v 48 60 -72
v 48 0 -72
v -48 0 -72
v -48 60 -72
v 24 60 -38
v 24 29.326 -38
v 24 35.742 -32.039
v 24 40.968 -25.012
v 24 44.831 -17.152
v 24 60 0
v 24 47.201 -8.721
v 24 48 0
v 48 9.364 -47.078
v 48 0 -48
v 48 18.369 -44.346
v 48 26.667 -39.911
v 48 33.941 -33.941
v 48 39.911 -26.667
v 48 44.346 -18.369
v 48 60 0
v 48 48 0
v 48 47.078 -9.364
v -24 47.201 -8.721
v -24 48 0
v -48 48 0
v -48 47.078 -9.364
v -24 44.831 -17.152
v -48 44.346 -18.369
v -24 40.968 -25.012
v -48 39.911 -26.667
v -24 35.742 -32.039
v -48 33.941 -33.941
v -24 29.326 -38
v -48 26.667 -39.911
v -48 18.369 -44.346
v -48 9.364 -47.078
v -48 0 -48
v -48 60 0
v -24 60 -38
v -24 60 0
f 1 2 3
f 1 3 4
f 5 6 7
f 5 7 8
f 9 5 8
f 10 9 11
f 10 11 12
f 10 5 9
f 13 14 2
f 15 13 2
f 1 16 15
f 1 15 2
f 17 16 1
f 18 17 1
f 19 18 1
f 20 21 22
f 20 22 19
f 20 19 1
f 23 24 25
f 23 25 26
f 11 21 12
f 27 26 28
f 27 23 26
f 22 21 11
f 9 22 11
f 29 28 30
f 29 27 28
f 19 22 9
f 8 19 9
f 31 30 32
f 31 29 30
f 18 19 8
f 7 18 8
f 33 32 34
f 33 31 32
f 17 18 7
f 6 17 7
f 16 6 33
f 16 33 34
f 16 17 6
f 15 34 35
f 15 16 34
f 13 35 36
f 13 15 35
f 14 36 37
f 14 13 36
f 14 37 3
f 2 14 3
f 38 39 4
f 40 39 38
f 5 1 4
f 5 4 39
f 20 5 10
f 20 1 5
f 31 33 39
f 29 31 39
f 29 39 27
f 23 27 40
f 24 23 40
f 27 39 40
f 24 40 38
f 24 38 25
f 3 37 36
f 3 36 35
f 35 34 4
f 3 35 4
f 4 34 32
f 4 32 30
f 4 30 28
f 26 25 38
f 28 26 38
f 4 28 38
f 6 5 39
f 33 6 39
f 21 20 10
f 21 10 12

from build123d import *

# Parameters (mm, degrees)
F1_DEPTH = 48
F2_W     = 48
F2_H     = 38
F3_DEPTH = 60.001


with BuildPart() as f1:
    # F0 (on Right) → F1 (new body, symmetric)
    with BuildSketch(Plane.YZ):
        with BuildLine():
            ThreePointArc((48, 0), (33.941125, -33.941125), (0, -48))
            Line((0, -48), (0, -72))
            Line((0, -72), (60, -72))
            Line((60, -72), (60, 0))
            Line((60, 0), (48, 0))
        make_face()
    extrude(amount=F1_DEPTH, both=True)

    # F2 (on face) → F3 (cut, through all)
    with BuildSketch(Plane(origin=(0, 60, 0), x_dir=(-1, 0, 0), z_dir=(0, 1, 0))):
        with Locations((0, -19)):
            Rectangle(F2_W, F2_H)
    extrude(amount=-F3_DEPTH, mode=Mode.SUBTRACT)


solid = f1.part
